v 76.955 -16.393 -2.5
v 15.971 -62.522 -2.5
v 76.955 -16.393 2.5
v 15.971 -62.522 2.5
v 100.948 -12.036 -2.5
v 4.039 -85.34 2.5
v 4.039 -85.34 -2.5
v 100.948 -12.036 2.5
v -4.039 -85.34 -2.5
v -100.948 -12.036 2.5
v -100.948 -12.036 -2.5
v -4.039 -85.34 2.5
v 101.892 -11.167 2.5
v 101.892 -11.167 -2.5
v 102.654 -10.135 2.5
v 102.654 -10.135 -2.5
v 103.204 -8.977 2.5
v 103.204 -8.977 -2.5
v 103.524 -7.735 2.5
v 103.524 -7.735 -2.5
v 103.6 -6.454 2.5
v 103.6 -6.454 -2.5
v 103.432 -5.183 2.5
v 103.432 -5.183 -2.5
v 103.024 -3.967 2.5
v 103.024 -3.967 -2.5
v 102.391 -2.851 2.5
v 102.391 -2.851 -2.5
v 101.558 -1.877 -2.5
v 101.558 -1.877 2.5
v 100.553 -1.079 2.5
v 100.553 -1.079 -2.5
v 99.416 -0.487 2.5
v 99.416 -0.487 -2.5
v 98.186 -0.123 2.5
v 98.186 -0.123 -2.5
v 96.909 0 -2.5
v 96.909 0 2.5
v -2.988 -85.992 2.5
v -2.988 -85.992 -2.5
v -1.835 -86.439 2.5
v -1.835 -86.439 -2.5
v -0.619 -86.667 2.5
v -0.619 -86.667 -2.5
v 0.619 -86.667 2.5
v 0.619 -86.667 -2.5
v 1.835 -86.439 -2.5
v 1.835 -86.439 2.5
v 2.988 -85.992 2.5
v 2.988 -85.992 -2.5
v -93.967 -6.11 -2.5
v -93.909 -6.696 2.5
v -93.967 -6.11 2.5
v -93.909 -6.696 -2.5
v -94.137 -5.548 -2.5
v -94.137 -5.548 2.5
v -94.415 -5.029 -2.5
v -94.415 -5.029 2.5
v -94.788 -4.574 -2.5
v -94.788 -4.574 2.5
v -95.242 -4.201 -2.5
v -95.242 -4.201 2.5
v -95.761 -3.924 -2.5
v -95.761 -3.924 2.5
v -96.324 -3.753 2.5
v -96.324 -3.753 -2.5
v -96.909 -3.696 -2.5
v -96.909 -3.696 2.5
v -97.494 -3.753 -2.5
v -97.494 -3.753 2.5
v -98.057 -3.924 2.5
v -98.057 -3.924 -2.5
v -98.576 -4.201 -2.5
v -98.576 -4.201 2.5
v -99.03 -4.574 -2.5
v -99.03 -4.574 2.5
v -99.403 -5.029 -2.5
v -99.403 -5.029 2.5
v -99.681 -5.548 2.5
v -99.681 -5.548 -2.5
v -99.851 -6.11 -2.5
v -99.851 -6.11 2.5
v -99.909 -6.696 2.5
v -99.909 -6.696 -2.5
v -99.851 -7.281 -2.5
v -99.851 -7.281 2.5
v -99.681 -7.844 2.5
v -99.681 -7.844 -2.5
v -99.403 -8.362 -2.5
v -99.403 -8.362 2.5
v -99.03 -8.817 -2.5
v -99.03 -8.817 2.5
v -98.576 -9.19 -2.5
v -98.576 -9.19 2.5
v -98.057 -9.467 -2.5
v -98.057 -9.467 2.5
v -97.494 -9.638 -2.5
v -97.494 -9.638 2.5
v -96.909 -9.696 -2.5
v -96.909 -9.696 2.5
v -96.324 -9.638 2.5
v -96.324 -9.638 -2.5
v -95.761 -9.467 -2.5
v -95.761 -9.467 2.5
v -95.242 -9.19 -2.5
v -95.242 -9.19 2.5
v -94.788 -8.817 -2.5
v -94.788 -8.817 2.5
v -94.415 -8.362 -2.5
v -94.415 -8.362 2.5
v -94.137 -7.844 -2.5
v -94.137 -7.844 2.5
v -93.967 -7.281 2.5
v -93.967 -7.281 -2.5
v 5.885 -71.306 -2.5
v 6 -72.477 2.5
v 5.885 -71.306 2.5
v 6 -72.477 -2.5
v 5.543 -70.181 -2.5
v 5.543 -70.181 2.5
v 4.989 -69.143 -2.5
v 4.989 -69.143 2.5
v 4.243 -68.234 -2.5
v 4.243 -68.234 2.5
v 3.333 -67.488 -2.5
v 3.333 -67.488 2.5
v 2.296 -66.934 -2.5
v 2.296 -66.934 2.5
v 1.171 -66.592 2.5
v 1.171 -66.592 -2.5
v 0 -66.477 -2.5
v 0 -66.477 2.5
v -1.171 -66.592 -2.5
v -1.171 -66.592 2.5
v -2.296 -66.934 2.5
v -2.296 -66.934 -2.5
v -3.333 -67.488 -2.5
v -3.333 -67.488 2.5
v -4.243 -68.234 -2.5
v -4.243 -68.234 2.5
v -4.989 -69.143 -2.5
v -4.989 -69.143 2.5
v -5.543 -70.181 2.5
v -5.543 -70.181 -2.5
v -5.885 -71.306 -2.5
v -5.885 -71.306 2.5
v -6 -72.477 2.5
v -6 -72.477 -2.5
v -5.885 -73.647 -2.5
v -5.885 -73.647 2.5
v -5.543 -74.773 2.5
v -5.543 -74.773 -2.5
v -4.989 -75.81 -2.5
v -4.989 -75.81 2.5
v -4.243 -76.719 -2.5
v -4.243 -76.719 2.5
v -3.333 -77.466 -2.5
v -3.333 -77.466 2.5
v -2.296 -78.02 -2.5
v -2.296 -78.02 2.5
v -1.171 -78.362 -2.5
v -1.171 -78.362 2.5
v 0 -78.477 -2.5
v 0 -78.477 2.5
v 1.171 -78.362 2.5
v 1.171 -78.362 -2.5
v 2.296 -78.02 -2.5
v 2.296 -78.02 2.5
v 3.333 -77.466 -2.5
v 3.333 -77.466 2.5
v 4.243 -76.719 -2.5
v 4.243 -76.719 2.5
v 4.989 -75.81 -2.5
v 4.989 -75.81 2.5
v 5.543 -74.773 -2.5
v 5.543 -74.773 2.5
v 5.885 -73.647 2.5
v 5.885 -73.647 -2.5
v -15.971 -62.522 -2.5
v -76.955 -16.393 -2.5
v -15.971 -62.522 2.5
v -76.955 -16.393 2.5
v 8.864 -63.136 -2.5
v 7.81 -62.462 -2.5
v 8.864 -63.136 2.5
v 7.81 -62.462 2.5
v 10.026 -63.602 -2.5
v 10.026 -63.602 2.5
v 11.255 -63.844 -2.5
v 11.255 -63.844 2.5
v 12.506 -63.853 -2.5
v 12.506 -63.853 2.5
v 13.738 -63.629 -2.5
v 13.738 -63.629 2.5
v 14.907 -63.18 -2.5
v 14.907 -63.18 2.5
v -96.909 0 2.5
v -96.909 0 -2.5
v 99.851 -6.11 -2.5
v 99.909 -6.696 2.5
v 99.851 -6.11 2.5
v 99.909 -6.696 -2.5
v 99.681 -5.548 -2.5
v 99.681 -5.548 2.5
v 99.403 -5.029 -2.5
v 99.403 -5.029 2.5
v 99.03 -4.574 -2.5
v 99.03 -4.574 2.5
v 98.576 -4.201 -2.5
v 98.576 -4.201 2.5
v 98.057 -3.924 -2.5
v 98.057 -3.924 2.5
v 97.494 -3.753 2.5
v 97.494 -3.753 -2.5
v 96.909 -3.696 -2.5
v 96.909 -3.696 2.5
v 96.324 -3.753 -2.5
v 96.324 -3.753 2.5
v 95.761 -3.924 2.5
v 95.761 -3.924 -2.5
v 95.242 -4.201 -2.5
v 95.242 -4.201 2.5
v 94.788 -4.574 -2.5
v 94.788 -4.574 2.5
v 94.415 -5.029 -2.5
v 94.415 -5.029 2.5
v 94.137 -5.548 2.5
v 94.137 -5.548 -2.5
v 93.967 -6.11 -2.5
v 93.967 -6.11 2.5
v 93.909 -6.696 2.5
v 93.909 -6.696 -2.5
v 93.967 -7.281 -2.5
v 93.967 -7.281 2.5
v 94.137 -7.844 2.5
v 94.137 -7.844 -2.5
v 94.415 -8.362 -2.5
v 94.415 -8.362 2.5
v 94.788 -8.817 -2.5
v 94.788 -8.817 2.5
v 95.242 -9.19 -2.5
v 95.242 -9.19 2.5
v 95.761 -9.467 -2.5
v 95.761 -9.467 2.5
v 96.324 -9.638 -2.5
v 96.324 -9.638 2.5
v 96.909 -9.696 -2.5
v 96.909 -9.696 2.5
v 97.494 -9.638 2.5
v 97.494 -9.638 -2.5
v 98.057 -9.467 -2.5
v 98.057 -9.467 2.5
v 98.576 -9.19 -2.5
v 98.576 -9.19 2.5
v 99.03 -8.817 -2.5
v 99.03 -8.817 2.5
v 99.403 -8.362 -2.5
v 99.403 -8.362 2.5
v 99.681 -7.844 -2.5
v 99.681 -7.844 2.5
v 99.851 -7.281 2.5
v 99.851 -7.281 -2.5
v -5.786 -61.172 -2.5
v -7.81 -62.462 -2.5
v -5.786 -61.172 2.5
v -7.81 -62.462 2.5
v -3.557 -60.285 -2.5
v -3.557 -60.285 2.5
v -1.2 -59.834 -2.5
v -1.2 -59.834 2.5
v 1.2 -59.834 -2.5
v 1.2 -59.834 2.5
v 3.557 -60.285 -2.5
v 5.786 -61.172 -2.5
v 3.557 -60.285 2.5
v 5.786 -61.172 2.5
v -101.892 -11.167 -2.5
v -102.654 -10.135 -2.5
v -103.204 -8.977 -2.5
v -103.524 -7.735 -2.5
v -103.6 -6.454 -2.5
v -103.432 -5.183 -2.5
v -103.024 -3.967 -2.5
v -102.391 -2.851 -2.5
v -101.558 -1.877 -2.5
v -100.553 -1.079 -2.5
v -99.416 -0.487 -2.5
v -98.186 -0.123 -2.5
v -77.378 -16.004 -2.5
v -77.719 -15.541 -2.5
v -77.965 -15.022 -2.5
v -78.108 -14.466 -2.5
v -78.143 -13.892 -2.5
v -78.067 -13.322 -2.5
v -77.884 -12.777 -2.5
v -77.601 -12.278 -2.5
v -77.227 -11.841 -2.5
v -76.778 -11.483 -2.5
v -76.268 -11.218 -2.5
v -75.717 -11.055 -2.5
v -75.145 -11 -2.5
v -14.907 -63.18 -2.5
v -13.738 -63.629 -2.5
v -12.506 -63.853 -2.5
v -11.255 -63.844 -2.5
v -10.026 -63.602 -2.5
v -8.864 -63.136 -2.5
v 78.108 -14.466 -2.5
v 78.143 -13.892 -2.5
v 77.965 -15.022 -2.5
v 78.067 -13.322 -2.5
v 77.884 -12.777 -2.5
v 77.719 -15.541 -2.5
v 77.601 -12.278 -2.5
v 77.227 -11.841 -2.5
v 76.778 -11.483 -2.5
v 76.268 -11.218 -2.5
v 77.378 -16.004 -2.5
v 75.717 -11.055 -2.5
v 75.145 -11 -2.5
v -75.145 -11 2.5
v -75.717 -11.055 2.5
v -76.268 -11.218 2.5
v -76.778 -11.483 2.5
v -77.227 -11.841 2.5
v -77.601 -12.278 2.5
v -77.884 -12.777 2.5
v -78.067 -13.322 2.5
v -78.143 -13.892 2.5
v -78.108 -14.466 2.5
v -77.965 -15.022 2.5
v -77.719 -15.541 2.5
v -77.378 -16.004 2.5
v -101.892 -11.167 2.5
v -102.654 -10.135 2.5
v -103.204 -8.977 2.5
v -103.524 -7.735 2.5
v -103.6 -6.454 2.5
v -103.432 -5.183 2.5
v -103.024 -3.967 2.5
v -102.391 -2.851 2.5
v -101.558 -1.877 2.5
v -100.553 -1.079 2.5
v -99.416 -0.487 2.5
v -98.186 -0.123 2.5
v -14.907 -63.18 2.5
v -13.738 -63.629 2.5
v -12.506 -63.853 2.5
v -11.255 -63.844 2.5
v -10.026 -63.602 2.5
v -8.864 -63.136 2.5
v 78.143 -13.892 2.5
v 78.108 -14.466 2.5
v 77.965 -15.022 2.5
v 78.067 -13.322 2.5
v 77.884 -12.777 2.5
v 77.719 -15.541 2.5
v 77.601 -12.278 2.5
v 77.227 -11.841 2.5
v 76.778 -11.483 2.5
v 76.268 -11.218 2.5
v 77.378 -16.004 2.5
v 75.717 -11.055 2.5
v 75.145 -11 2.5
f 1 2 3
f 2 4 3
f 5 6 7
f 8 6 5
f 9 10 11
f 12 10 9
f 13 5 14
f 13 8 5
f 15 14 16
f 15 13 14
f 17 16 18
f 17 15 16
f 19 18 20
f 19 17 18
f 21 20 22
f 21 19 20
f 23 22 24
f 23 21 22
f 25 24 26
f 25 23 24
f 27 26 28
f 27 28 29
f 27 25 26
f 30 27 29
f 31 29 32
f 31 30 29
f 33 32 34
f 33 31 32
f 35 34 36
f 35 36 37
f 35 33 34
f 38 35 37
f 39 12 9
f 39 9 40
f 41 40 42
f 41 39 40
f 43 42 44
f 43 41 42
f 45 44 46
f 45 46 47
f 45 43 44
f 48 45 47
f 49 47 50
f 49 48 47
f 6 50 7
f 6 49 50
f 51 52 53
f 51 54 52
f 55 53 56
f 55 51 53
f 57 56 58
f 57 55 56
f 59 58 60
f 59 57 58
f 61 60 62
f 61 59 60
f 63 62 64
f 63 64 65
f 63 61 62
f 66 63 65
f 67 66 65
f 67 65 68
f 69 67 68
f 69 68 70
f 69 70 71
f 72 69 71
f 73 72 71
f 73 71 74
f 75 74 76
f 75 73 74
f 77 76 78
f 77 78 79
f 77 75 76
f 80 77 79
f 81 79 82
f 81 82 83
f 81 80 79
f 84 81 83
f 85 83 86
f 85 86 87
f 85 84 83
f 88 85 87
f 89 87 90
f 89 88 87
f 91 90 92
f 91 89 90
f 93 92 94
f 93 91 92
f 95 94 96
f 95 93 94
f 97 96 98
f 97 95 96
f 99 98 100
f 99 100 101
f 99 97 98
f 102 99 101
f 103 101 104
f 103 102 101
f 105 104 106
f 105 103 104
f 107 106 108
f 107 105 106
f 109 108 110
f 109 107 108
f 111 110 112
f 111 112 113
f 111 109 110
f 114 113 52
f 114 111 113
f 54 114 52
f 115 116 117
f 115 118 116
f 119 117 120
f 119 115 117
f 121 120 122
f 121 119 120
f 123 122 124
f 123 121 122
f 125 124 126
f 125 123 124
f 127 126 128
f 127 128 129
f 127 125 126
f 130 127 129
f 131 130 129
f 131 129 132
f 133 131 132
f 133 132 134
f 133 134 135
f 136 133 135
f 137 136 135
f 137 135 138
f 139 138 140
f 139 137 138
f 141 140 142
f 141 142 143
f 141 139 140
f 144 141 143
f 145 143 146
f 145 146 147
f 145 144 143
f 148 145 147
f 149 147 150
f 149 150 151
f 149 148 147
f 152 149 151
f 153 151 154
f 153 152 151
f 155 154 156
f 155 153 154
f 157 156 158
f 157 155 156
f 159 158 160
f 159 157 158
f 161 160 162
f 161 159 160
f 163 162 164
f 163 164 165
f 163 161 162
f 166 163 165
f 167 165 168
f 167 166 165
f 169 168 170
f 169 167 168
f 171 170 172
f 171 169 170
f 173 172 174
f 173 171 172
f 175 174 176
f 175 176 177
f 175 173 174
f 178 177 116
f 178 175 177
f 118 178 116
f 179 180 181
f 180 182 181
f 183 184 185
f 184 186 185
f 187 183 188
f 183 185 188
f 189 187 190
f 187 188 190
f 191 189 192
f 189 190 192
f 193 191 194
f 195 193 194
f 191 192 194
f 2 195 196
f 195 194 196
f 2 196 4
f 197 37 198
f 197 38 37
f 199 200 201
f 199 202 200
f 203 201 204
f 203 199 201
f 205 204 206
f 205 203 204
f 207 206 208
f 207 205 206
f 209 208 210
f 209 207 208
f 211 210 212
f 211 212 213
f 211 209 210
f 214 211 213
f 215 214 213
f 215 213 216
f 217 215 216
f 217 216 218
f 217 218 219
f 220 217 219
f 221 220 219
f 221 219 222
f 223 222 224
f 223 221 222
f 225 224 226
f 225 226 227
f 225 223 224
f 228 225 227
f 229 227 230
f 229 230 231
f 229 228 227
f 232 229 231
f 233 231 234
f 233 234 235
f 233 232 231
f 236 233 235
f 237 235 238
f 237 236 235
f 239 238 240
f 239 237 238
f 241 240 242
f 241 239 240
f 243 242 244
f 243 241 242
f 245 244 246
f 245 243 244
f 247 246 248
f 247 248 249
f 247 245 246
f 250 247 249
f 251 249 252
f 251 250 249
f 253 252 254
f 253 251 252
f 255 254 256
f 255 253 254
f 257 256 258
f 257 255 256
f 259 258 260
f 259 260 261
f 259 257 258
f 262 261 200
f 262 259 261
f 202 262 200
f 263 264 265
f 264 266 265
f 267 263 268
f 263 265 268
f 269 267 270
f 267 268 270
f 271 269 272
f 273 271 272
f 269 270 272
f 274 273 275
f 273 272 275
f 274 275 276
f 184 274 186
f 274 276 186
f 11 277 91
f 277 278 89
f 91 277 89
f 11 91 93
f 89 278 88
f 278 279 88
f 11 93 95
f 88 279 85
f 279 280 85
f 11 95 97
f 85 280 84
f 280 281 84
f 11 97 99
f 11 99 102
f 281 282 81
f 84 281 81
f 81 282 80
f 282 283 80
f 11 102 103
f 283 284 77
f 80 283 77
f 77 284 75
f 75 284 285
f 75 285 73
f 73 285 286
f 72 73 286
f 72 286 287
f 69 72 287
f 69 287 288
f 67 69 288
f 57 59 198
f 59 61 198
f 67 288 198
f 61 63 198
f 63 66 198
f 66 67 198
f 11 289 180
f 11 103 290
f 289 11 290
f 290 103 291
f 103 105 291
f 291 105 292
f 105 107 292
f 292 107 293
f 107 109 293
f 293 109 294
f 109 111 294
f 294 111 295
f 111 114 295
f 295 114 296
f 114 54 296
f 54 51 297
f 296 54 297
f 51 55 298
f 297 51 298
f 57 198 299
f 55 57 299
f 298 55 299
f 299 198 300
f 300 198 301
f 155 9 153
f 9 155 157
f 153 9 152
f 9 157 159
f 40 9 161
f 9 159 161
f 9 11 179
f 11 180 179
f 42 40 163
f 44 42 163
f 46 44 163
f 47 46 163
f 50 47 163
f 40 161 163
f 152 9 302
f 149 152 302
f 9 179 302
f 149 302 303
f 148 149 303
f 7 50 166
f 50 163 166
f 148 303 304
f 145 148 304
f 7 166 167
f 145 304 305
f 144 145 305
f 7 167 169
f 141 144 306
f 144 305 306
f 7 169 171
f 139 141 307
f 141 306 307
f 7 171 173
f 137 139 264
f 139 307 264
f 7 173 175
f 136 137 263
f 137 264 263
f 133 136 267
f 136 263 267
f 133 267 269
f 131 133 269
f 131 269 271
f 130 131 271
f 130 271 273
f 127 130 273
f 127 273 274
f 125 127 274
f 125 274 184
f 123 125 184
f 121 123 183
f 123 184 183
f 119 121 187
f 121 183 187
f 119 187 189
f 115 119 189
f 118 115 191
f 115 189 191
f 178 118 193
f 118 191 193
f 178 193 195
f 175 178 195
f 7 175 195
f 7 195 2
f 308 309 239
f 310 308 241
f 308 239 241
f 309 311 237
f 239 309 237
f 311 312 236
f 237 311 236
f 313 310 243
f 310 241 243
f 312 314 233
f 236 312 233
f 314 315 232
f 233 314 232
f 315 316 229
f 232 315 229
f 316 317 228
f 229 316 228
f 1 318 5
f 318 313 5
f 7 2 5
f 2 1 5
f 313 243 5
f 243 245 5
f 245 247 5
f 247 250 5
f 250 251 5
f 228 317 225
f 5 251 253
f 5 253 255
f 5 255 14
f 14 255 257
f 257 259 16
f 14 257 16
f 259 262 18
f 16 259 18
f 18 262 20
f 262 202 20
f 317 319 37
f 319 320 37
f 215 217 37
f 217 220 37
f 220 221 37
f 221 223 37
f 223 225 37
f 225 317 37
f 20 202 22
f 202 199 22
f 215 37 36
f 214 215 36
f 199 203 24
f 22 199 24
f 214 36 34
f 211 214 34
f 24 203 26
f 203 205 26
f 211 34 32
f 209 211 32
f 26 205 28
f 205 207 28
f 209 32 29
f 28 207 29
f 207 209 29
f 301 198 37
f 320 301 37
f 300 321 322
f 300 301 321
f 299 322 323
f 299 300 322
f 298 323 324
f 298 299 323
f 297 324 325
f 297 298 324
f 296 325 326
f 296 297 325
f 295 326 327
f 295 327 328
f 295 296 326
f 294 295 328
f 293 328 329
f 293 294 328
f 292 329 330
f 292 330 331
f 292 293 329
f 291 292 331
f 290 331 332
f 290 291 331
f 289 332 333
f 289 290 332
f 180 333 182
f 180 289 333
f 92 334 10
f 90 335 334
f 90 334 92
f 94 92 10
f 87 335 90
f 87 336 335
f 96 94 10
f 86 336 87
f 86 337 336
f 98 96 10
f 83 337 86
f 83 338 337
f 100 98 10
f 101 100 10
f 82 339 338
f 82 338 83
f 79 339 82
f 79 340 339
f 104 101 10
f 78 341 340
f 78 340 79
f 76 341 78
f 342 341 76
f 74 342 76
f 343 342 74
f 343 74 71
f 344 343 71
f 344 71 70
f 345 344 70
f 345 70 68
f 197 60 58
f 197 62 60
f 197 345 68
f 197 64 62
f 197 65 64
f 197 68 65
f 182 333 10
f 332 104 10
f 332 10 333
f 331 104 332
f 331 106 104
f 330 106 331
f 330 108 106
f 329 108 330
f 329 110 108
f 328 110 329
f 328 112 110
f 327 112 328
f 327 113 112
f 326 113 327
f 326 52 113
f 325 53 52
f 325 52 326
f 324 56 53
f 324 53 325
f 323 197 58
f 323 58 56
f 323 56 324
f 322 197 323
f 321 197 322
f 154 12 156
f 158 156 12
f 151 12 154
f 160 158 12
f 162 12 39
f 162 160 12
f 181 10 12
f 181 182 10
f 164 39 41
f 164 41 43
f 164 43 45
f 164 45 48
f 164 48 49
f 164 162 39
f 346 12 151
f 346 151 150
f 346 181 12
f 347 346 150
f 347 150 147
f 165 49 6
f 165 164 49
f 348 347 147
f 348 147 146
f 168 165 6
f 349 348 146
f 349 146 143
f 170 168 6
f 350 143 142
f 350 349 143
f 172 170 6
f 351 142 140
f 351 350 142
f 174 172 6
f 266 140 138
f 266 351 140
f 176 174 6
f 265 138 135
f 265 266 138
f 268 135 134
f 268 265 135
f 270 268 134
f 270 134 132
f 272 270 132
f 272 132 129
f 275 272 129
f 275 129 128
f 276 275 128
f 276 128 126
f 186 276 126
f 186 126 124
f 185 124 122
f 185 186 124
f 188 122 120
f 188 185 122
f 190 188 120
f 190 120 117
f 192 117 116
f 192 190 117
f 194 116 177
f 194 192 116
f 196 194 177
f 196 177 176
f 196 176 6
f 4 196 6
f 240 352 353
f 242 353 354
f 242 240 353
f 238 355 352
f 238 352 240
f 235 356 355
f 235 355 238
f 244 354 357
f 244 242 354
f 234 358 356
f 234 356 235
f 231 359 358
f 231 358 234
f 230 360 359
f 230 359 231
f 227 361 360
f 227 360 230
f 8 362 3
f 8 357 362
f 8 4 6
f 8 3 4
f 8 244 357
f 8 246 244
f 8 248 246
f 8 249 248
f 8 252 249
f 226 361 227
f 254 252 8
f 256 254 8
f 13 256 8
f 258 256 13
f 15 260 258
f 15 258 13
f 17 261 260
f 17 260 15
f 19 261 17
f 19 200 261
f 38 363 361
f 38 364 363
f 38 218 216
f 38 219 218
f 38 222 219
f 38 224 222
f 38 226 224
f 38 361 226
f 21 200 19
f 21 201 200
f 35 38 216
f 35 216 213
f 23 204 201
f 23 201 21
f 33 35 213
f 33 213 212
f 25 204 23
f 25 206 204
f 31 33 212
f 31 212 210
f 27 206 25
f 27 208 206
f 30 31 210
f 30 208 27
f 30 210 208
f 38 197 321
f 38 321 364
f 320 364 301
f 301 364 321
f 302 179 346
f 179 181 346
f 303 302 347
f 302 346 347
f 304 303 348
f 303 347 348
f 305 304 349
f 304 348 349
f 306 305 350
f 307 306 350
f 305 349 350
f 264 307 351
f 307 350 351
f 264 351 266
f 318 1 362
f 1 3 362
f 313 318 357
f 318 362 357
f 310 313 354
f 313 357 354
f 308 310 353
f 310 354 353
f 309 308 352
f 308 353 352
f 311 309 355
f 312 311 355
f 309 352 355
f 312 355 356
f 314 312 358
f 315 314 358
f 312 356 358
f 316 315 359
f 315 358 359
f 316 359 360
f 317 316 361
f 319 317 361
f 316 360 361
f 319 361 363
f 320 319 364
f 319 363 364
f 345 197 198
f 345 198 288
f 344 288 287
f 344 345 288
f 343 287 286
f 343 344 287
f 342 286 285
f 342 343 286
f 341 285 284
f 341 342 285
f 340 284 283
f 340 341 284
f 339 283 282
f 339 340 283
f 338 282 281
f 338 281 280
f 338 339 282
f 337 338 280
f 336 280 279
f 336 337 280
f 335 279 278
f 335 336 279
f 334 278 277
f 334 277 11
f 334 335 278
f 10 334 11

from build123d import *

# Parameters (mm, degrees)
SKETCH1_R           = 3
SKETCH1_R_2         = 6
BOSS_EXTRUDE1_DEPTH = 2.5


with BuildPart() as part:
    # Sketch1 → Boss-Extrude1 (new body, symmetric)
    with BuildSketch(Plane.XY):
        with BuildLine():
            Line((96.909065007, 0), (-96.909065007, 0))
            ThreePointArc((-96.909065007, 0), (-103.256738035, -4.565267366), (-100.94836092, -12.035609666))
            Line((-100.94836092, -12.035609666), (-4.039295913, -85.339986595))
            ThreePointArc((-4.039295913, -85.339986595), (0, -86.695623071), (4.039295913, -85.339986595))
            Line((4.039295913, -85.339986595), (100.94836092, -12.035609666))
            ThreePointArc((100.94836092, -12.035609666), (103.256738035, -4.565267366), (96.909065007, 0))
        make_face()
        with Locations((96.909065007, -6.695623071)):
            Circle(SKETCH1_R, mode=Mode.SUBTRACT)
        with Locations((-96.909065007, -6.695623071)):
            Circle(SKETCH1_R, mode=Mode.SUBTRACT)
        with Locations((0, -72.476809125)):
            Circle(SKETCH1_R_2, mode=Mode.SUBTRACT)
        with BuildLine():
            Line((-76.954542332, -16.392601796), (-15.971447816, -62.521699692))
            ThreePointArc((-15.971447816, -62.521699692), (-11.880304954, -63.878041653), (-7.809525514, -62.461754894))
            ThreePointArc((-7.809525514, -62.461754894), (0, -59.776809125), (7.809525514, -62.461754894))
            ThreePointArc((7.809525514, -62.461754894), (11.880304954, -63.878041653), (15.971447816, -62.521699692))
            Line((15.971447816, -62.521699692), (76.954542332, -16.392601796))
            ThreePointArc((76.954542332, -16.392601796), (77.988819691, -13.045485827), (75.144720063, -11))
            Line((75.144720063, -11), (-75.144720063, -11))
            ThreePointArc((-75.144720063, -11), (-77.988819691, -13.045485827), (-76.954542332, -16.392601796))
        make_face(mode=Mode.SUBTRACT)
    extrude(amount=BOSS_EXTRUDE1_DEPTH, both=True)


solid = part.part
